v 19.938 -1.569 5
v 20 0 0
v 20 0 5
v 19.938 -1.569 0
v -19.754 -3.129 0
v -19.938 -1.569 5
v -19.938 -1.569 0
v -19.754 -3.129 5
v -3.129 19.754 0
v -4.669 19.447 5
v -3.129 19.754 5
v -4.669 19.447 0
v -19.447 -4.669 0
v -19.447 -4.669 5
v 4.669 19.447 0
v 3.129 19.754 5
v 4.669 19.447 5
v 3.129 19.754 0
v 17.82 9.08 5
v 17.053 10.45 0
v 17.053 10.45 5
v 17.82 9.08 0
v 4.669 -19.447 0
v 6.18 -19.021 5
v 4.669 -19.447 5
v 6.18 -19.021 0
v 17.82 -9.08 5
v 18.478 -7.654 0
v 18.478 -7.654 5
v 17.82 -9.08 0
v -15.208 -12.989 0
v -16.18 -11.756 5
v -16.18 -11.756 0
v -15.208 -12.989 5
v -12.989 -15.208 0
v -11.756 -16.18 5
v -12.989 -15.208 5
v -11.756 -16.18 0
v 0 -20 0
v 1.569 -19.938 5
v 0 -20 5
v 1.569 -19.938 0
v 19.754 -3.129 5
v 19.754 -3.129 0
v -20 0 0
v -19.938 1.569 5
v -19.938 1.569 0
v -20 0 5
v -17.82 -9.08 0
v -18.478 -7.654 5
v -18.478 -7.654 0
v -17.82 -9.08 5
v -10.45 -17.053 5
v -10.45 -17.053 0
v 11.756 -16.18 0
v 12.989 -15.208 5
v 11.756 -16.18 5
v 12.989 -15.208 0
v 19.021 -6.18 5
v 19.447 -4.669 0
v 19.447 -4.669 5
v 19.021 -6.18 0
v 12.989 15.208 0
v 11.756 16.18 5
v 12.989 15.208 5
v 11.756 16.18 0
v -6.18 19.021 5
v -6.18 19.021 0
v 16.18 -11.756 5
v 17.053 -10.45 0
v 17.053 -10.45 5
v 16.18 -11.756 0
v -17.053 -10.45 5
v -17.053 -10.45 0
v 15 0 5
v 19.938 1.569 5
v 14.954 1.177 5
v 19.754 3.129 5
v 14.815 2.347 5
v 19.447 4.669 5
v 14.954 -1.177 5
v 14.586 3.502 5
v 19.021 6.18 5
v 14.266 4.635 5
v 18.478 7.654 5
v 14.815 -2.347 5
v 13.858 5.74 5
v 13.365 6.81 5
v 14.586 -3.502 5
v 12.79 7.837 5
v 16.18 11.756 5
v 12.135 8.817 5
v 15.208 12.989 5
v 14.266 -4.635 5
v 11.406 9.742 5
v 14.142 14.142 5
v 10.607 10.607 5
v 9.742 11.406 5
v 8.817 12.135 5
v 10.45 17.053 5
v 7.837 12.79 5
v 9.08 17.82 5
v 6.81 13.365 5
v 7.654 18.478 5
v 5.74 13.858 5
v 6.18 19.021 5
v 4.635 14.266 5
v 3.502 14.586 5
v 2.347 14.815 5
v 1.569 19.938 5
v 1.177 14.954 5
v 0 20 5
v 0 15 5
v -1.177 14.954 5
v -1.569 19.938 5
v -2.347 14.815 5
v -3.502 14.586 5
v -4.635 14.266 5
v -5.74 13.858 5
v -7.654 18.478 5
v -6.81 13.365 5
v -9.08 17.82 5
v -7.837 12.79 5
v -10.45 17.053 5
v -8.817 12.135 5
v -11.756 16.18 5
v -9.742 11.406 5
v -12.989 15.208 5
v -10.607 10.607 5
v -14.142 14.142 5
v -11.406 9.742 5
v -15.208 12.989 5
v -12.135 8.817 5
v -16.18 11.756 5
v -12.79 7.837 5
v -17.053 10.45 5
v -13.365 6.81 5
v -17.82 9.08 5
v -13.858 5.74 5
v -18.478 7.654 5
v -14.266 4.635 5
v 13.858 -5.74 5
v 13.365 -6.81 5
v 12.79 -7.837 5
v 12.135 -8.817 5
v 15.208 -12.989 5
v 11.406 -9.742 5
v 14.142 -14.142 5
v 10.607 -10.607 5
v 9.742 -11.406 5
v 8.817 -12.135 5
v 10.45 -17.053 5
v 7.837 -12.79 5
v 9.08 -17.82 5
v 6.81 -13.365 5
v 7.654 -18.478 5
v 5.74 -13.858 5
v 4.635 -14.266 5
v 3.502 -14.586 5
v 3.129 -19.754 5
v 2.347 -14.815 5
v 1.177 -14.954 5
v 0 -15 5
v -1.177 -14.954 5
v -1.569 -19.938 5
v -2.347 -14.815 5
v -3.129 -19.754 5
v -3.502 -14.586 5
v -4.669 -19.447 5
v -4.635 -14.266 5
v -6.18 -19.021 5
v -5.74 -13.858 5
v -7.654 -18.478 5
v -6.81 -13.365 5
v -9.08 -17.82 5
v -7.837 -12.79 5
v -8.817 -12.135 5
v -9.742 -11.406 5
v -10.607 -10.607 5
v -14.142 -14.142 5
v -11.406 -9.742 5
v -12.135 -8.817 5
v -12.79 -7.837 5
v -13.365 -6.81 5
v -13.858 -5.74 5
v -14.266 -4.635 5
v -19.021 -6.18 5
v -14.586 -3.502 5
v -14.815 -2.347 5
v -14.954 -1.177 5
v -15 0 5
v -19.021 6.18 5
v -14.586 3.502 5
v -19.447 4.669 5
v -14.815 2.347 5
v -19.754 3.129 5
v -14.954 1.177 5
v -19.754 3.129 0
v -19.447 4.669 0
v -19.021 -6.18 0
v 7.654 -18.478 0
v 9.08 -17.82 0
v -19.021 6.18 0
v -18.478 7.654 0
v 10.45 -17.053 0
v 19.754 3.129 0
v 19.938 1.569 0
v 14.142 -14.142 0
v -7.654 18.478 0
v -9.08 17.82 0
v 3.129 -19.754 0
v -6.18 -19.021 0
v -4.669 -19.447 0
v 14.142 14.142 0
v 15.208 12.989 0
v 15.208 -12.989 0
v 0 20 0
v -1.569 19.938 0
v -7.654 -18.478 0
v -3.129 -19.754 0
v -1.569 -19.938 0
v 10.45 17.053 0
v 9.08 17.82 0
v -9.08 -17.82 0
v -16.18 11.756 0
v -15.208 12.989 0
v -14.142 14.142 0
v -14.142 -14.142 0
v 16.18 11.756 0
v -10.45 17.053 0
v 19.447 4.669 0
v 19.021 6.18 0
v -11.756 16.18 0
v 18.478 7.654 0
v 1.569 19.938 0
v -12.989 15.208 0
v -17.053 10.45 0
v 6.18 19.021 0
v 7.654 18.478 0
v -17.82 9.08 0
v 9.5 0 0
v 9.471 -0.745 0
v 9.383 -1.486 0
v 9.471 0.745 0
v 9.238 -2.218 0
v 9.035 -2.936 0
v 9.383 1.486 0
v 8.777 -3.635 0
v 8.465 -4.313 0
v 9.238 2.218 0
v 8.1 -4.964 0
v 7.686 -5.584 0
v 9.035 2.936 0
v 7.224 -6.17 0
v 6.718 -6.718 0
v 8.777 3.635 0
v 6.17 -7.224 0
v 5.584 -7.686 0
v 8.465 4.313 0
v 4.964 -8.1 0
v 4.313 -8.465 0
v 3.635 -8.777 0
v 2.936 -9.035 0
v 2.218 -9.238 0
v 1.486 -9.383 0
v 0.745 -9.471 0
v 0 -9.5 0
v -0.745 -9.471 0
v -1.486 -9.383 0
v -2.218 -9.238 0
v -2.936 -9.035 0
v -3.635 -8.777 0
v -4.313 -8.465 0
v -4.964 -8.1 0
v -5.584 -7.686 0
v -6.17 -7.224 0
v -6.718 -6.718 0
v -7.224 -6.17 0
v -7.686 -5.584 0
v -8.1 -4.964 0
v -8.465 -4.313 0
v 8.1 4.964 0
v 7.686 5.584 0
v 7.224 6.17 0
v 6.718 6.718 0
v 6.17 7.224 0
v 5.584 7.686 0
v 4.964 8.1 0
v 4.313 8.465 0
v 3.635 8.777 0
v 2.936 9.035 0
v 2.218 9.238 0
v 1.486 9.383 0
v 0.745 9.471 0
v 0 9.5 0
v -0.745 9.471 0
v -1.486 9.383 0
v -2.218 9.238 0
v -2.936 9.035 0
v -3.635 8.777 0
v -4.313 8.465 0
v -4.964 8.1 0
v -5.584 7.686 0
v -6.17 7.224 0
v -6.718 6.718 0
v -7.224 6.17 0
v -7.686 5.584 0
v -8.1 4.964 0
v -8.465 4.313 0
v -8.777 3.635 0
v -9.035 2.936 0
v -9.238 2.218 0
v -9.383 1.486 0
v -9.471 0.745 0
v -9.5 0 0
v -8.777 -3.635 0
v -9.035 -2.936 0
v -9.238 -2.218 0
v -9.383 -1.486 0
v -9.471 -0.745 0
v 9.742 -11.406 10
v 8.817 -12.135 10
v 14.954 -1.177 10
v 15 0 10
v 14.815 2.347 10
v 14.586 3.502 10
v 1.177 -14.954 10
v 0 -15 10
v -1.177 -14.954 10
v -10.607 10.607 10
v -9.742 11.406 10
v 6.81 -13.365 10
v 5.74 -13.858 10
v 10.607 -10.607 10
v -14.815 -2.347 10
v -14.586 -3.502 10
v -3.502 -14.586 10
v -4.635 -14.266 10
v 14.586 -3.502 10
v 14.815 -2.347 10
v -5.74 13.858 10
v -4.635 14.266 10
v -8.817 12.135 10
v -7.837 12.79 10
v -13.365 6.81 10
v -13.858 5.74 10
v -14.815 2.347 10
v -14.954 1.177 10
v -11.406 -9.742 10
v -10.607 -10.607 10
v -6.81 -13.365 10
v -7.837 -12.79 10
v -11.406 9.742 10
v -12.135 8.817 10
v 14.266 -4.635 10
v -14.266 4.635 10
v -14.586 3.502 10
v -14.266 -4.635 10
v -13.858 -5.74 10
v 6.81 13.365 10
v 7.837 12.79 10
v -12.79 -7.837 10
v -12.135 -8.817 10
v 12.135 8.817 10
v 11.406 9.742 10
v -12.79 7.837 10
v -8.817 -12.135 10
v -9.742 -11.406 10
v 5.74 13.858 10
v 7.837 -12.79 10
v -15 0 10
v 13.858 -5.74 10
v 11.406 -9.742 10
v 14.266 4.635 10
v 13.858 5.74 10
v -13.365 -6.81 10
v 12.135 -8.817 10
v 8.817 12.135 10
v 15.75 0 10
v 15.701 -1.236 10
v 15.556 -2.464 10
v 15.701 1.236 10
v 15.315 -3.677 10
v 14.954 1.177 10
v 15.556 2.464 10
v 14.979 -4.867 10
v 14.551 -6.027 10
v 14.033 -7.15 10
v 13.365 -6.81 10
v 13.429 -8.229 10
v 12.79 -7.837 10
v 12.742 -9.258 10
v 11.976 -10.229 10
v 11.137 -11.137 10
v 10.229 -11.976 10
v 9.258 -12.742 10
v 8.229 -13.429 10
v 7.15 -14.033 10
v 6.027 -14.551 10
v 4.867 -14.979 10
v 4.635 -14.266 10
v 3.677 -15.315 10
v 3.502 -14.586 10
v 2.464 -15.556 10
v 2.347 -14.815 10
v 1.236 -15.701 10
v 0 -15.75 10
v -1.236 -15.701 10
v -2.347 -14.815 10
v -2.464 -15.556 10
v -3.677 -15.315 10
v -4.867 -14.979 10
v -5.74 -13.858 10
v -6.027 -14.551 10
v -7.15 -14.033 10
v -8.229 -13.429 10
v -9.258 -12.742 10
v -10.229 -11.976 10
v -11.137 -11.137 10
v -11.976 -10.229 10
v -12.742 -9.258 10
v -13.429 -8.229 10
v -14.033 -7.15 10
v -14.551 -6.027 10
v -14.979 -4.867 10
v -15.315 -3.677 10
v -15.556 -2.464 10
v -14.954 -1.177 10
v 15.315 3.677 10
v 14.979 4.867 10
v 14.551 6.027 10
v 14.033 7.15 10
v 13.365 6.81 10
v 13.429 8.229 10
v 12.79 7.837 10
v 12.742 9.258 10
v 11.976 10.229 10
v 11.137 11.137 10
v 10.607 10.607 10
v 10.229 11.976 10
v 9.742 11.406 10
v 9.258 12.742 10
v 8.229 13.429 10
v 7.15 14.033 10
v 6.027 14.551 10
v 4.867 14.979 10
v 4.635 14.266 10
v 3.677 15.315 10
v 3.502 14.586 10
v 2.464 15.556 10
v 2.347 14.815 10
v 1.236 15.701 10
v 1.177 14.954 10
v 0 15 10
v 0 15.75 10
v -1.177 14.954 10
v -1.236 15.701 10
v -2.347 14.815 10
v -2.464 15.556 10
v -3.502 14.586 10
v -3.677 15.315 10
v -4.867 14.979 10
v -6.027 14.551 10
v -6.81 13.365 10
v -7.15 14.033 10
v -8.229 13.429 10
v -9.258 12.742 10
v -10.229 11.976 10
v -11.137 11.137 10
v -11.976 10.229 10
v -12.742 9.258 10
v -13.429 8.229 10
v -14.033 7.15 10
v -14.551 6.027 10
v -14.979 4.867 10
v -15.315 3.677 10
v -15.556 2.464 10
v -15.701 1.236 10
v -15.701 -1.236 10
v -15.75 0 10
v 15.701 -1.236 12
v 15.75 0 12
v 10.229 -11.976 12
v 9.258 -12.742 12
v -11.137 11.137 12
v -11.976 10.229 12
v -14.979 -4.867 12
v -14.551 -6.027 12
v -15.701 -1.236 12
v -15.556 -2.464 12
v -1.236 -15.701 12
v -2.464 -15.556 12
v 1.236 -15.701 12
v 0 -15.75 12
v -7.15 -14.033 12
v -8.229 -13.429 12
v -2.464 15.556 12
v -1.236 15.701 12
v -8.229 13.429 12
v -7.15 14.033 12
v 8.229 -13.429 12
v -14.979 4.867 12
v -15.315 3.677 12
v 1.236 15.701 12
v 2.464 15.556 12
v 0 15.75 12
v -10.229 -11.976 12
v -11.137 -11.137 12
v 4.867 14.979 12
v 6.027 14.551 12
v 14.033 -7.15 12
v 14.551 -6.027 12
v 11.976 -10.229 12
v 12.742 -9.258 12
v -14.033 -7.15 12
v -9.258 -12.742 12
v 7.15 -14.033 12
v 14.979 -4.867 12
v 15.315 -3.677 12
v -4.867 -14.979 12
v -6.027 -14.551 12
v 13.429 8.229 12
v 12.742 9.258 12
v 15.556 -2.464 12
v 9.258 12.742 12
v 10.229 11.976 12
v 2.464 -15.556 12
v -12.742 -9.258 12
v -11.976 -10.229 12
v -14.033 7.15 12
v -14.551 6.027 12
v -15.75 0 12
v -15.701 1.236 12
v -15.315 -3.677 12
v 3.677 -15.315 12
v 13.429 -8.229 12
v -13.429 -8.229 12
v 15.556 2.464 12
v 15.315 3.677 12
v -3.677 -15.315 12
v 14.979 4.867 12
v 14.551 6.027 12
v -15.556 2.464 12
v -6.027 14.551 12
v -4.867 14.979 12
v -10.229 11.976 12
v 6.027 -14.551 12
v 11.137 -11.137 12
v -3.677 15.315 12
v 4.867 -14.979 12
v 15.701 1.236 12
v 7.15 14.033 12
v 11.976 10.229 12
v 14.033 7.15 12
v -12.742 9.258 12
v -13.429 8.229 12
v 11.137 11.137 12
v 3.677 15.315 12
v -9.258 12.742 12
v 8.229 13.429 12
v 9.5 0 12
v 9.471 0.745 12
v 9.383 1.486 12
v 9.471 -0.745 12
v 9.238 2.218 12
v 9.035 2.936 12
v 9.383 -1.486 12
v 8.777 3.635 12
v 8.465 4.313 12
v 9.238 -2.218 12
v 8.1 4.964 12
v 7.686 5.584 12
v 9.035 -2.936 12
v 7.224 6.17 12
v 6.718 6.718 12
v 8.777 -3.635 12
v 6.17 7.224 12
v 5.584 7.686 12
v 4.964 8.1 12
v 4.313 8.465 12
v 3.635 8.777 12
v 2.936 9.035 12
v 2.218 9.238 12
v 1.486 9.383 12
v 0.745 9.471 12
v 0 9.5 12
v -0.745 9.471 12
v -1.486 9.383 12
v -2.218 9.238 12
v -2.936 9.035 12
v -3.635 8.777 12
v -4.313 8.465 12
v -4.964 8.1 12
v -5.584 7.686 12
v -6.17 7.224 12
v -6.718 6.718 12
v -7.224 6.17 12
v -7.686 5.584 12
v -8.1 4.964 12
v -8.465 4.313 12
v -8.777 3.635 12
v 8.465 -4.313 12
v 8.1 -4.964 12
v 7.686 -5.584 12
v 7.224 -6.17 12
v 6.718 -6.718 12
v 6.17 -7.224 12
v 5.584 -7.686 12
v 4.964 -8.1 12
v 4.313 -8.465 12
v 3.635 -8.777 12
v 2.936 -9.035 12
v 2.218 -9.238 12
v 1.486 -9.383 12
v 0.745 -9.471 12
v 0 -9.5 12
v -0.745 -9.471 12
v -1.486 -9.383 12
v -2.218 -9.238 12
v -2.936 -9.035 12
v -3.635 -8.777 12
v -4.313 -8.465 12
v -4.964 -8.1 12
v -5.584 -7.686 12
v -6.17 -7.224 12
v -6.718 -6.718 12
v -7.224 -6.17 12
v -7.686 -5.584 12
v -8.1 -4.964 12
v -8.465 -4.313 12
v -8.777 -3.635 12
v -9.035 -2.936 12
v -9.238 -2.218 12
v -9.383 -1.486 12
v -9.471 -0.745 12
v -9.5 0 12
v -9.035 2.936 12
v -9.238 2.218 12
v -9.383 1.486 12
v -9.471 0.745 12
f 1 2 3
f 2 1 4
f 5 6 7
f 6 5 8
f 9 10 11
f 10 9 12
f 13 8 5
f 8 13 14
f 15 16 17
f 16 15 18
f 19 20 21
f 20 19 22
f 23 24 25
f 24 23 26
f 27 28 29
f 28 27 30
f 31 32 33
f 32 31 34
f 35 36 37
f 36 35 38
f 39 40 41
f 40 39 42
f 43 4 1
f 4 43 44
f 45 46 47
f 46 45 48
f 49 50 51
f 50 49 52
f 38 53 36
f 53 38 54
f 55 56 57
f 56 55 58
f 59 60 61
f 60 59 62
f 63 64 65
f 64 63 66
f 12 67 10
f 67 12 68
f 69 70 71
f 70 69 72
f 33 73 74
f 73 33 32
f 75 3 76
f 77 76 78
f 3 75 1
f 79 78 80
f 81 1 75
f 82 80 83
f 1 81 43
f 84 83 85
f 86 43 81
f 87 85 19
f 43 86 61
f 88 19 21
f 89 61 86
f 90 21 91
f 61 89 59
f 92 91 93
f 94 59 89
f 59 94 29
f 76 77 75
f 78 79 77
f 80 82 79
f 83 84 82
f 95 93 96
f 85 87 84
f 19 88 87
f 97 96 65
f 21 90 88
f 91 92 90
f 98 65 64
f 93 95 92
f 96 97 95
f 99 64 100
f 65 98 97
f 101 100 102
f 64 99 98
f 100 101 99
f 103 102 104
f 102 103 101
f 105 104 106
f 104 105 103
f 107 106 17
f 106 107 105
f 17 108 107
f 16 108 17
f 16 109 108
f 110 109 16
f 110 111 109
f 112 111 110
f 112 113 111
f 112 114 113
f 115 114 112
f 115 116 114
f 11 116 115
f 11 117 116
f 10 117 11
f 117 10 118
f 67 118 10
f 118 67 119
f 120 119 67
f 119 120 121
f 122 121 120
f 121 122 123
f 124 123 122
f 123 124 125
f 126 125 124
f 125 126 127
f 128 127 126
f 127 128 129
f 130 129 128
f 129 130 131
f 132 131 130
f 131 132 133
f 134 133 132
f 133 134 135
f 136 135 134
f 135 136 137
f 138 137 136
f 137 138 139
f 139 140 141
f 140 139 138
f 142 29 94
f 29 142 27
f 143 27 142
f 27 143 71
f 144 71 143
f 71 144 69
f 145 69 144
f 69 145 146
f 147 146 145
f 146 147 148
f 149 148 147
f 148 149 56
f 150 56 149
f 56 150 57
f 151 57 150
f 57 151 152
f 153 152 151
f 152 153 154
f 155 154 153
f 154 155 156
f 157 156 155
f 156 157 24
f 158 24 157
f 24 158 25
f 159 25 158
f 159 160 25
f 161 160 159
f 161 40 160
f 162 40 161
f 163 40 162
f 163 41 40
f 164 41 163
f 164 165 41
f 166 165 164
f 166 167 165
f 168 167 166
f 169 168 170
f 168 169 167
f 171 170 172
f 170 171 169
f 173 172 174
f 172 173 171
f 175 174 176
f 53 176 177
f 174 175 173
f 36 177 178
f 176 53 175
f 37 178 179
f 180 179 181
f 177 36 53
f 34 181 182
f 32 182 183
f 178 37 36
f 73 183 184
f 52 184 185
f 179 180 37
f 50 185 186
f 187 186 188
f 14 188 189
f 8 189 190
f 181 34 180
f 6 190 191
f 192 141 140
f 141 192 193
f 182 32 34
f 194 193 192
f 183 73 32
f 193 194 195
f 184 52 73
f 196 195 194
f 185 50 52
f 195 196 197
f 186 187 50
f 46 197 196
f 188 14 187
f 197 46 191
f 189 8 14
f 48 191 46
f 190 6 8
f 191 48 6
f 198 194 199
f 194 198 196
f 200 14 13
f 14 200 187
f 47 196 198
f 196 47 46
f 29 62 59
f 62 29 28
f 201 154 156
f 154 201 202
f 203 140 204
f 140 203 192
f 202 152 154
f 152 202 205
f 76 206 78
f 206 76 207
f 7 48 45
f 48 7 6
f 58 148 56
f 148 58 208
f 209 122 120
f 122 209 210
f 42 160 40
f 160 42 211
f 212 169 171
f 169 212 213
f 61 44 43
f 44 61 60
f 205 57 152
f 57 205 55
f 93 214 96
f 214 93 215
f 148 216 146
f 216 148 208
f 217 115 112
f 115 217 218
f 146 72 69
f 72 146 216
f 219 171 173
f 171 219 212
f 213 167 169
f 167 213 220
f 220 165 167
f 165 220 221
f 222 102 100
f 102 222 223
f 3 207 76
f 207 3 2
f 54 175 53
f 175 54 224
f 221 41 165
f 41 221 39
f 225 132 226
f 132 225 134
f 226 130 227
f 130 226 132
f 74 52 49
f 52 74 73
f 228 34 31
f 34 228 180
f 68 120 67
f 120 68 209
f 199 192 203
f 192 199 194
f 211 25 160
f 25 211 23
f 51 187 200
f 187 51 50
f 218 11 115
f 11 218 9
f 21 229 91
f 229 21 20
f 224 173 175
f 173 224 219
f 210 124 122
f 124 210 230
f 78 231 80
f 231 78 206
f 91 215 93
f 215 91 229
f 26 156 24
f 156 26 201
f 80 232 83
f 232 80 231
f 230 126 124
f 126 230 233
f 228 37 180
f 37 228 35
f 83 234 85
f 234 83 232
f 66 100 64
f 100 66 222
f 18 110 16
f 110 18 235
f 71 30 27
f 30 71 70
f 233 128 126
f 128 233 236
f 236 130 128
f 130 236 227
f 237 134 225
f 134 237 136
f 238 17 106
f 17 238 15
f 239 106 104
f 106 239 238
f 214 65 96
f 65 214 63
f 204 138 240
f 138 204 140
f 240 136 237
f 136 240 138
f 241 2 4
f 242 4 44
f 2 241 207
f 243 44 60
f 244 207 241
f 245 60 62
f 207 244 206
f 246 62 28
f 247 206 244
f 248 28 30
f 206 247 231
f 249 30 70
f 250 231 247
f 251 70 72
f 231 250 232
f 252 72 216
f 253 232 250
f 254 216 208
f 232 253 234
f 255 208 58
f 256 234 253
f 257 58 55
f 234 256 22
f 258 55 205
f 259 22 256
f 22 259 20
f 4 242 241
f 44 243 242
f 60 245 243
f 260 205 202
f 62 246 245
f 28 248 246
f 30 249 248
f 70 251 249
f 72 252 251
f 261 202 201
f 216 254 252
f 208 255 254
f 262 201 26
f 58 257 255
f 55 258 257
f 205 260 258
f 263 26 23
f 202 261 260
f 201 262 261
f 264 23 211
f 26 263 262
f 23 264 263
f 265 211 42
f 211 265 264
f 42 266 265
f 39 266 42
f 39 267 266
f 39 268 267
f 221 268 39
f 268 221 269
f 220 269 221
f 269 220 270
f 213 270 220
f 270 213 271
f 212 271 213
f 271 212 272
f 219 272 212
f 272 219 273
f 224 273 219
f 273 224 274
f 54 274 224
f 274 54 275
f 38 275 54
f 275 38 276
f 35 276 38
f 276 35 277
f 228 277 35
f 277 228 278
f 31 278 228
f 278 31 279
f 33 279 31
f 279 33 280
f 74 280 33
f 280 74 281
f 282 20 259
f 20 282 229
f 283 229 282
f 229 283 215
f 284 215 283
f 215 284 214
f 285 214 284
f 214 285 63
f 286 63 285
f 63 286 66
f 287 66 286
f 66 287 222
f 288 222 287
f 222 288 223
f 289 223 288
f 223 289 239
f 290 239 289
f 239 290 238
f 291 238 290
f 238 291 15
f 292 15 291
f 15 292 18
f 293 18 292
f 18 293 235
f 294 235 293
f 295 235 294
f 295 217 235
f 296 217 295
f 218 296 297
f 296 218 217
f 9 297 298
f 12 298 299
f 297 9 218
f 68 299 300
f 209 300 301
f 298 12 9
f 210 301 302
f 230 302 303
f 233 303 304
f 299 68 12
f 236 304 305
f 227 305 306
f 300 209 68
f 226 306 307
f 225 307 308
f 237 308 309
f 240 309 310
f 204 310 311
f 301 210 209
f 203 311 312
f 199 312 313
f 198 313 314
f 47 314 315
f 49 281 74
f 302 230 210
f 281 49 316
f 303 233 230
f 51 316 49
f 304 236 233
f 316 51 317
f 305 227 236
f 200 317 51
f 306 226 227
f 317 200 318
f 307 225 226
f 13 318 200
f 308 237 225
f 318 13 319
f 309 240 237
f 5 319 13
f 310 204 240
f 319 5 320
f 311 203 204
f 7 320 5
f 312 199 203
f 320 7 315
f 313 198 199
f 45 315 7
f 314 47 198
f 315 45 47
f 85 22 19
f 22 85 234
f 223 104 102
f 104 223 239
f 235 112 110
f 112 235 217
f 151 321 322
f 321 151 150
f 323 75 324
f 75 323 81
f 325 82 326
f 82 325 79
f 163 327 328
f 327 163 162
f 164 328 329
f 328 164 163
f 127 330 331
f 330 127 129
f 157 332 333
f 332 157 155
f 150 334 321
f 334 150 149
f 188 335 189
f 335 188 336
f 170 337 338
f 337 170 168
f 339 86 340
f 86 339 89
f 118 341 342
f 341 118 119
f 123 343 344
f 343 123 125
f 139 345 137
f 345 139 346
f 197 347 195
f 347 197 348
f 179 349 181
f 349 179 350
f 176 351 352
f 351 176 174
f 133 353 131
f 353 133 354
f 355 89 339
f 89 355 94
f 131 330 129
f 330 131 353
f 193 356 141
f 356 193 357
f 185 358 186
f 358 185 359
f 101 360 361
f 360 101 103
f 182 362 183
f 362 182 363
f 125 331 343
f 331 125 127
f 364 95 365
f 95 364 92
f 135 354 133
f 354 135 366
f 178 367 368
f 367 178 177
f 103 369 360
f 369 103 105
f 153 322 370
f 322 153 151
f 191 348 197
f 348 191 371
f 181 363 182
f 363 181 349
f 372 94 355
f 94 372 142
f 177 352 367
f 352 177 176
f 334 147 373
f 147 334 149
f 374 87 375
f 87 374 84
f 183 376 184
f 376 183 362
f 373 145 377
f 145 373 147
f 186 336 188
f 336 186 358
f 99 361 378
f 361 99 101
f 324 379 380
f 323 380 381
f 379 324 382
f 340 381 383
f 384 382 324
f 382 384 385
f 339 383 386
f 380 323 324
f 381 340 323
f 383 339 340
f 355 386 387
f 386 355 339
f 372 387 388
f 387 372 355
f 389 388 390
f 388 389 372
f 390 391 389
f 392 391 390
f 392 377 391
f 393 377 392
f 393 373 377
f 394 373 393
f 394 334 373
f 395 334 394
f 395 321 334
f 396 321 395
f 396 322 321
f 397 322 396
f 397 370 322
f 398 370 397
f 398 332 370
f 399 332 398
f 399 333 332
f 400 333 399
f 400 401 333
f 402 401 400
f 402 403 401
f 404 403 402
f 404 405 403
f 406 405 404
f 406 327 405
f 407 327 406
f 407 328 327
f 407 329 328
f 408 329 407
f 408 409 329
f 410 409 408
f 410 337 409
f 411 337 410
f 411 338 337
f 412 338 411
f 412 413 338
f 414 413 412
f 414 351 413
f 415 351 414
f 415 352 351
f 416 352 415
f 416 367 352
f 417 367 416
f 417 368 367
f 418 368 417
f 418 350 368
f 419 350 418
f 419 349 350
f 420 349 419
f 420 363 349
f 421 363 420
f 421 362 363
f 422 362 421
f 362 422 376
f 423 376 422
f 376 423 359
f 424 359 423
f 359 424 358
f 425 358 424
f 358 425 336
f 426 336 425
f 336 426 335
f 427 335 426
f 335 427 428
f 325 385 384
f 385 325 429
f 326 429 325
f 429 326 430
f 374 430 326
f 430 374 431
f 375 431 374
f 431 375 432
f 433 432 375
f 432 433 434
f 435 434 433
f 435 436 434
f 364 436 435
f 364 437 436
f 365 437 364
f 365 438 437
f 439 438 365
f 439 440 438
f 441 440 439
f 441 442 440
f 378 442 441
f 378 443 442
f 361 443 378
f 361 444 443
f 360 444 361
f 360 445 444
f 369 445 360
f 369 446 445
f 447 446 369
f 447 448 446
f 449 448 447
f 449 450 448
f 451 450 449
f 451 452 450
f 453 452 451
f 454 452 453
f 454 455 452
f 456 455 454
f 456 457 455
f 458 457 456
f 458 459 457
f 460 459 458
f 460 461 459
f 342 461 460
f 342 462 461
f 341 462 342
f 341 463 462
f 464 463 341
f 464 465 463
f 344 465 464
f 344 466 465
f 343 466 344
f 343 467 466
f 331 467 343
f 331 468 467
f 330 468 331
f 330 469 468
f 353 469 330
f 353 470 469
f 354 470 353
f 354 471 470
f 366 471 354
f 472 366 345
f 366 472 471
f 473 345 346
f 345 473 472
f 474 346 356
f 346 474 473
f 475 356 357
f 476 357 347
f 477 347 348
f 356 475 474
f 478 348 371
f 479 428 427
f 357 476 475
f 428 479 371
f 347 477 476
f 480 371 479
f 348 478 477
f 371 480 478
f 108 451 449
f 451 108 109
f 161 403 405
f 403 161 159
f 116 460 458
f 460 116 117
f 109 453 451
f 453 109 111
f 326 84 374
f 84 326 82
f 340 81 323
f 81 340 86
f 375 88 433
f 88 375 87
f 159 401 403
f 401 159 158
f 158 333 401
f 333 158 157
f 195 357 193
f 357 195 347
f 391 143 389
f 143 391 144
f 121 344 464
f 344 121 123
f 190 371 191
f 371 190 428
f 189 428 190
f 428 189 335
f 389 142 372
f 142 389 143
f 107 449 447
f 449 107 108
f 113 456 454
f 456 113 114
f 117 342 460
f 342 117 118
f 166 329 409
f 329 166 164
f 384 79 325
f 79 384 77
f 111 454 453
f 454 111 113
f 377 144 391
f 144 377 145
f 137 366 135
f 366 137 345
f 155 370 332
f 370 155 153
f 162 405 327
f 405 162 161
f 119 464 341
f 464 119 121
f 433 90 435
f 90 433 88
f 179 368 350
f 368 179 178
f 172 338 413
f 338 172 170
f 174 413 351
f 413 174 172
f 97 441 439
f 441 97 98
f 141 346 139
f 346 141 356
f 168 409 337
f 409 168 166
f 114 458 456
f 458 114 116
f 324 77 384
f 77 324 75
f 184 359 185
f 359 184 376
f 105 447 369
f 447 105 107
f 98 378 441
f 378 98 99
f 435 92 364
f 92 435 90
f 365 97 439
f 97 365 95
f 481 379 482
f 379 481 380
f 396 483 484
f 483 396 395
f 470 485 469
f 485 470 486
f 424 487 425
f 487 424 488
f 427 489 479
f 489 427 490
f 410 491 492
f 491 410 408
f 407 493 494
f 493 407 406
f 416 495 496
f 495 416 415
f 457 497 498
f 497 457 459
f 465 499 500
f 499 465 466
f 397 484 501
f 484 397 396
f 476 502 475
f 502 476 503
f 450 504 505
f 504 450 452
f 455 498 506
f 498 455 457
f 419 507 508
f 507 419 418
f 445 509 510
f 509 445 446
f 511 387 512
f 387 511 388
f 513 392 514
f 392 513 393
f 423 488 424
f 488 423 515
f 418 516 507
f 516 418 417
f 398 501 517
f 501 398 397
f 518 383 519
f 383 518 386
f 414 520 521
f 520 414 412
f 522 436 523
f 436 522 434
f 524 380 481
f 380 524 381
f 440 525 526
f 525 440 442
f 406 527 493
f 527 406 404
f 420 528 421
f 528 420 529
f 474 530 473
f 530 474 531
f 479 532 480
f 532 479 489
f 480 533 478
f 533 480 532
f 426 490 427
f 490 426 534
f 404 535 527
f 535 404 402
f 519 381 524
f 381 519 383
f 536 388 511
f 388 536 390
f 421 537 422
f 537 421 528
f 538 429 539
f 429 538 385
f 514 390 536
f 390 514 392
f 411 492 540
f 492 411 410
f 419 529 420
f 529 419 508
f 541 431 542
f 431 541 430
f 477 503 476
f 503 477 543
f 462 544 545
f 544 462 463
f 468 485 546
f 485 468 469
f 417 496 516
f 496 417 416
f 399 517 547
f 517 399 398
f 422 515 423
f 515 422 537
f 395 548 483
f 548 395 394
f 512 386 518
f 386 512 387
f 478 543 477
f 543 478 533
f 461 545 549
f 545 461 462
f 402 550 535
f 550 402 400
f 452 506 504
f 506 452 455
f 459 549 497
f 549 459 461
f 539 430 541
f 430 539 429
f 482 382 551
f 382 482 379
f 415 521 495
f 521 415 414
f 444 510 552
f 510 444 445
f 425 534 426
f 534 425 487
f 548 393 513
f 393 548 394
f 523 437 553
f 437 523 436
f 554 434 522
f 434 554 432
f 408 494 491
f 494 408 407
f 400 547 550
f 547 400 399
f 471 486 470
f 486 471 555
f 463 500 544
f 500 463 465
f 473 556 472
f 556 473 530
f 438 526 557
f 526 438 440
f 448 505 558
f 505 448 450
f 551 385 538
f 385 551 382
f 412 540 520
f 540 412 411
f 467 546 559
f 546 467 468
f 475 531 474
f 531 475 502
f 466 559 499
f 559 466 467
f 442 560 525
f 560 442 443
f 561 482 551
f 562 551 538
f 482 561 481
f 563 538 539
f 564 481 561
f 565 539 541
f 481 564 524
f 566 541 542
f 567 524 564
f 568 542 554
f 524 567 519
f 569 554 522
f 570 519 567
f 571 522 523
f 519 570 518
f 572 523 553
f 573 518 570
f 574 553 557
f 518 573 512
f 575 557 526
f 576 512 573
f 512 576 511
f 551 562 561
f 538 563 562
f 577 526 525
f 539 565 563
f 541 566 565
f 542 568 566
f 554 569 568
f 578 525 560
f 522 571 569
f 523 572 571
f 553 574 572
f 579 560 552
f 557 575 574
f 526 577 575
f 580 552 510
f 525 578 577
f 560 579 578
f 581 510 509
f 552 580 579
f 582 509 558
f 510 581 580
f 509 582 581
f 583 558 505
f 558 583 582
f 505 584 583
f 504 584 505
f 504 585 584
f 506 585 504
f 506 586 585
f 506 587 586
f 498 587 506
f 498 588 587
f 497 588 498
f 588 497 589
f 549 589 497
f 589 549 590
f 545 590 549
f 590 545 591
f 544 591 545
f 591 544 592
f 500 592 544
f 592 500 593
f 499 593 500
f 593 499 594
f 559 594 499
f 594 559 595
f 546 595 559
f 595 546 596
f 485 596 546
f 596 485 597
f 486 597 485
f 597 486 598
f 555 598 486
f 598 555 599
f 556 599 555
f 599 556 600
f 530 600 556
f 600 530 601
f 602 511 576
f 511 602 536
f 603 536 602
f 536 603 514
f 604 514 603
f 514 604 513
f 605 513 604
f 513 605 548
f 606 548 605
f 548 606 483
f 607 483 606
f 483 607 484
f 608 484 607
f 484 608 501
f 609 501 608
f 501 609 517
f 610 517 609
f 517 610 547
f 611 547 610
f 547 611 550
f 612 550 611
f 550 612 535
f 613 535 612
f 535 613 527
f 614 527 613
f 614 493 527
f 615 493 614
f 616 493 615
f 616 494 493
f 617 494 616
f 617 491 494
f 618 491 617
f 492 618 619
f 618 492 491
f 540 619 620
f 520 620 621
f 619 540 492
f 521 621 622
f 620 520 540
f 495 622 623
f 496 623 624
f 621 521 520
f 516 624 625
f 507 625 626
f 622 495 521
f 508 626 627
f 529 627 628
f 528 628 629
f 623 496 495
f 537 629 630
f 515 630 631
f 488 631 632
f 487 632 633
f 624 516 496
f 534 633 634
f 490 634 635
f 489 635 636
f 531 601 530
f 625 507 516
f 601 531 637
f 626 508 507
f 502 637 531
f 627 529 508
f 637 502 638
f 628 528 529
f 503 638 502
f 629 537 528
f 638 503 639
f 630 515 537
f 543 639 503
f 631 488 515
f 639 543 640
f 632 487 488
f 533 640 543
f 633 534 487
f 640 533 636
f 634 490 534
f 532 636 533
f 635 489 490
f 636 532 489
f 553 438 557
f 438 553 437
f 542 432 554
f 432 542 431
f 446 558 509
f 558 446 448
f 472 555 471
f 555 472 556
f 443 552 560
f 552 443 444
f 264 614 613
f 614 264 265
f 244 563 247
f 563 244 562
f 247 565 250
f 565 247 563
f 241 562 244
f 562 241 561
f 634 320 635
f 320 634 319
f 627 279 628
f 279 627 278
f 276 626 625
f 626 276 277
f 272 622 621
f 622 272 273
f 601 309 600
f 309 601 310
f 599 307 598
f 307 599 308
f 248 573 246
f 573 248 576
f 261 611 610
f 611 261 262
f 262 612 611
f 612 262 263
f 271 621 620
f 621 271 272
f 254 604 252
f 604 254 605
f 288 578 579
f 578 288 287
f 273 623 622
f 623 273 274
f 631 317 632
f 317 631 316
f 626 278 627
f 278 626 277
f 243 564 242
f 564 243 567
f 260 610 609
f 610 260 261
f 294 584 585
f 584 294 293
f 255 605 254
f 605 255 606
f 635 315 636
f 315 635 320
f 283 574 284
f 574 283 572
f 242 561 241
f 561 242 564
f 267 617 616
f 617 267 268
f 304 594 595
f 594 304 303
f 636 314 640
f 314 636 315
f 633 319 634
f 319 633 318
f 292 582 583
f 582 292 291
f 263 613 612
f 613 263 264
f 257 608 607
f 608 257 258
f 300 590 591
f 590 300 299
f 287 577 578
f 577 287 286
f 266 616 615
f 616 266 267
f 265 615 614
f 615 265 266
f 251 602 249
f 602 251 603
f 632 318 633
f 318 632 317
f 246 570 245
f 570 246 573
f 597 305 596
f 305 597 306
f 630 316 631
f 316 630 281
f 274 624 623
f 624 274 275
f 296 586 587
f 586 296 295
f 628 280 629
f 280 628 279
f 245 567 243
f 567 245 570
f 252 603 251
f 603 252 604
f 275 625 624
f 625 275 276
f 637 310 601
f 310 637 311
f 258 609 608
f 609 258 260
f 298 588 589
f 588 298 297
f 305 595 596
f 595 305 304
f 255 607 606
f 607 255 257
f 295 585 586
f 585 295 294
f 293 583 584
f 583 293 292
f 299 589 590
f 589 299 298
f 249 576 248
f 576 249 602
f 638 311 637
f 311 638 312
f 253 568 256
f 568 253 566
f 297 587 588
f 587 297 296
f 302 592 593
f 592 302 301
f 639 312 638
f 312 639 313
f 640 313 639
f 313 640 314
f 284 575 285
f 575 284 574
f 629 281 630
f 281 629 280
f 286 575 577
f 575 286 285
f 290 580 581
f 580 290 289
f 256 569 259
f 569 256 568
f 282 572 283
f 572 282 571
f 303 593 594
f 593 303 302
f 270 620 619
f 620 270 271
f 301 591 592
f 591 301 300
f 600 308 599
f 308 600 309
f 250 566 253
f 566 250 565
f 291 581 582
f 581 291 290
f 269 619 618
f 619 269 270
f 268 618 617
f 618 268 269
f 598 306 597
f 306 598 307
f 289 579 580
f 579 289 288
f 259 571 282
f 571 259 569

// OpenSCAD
External_Busing_Diameter = 40; //External Bushing Diam
Internal_Spool_Diameter = 30; //Internal Diam of Spool to support
Tube_Or_Support_Diameter = 19; //Spool support Diam
Lip_Diameter = 1.5;
e_diam = External_Busing_Diameter;
i_diam = Internal_Spool_Diameter;
t_diam = Tube_Or_Support_Diameter;
l_diam = Lip_Diameter;
 difference(){
union(){translate([0,0,0])
    linear_extrude (5,$fn=80)
        circle(d=e_diam);
  
    linear_extrude (10,$fn=80)   
        circle (d=i_diam);
    translate([0,0,10])
    linear_extrude (2,$fn=80)
        circle (d=i_diam+l_diam);
}
    translate([0,0,0])
        linear_extrude (12,$fn=80)
        circle (d=t_diam);
    }
